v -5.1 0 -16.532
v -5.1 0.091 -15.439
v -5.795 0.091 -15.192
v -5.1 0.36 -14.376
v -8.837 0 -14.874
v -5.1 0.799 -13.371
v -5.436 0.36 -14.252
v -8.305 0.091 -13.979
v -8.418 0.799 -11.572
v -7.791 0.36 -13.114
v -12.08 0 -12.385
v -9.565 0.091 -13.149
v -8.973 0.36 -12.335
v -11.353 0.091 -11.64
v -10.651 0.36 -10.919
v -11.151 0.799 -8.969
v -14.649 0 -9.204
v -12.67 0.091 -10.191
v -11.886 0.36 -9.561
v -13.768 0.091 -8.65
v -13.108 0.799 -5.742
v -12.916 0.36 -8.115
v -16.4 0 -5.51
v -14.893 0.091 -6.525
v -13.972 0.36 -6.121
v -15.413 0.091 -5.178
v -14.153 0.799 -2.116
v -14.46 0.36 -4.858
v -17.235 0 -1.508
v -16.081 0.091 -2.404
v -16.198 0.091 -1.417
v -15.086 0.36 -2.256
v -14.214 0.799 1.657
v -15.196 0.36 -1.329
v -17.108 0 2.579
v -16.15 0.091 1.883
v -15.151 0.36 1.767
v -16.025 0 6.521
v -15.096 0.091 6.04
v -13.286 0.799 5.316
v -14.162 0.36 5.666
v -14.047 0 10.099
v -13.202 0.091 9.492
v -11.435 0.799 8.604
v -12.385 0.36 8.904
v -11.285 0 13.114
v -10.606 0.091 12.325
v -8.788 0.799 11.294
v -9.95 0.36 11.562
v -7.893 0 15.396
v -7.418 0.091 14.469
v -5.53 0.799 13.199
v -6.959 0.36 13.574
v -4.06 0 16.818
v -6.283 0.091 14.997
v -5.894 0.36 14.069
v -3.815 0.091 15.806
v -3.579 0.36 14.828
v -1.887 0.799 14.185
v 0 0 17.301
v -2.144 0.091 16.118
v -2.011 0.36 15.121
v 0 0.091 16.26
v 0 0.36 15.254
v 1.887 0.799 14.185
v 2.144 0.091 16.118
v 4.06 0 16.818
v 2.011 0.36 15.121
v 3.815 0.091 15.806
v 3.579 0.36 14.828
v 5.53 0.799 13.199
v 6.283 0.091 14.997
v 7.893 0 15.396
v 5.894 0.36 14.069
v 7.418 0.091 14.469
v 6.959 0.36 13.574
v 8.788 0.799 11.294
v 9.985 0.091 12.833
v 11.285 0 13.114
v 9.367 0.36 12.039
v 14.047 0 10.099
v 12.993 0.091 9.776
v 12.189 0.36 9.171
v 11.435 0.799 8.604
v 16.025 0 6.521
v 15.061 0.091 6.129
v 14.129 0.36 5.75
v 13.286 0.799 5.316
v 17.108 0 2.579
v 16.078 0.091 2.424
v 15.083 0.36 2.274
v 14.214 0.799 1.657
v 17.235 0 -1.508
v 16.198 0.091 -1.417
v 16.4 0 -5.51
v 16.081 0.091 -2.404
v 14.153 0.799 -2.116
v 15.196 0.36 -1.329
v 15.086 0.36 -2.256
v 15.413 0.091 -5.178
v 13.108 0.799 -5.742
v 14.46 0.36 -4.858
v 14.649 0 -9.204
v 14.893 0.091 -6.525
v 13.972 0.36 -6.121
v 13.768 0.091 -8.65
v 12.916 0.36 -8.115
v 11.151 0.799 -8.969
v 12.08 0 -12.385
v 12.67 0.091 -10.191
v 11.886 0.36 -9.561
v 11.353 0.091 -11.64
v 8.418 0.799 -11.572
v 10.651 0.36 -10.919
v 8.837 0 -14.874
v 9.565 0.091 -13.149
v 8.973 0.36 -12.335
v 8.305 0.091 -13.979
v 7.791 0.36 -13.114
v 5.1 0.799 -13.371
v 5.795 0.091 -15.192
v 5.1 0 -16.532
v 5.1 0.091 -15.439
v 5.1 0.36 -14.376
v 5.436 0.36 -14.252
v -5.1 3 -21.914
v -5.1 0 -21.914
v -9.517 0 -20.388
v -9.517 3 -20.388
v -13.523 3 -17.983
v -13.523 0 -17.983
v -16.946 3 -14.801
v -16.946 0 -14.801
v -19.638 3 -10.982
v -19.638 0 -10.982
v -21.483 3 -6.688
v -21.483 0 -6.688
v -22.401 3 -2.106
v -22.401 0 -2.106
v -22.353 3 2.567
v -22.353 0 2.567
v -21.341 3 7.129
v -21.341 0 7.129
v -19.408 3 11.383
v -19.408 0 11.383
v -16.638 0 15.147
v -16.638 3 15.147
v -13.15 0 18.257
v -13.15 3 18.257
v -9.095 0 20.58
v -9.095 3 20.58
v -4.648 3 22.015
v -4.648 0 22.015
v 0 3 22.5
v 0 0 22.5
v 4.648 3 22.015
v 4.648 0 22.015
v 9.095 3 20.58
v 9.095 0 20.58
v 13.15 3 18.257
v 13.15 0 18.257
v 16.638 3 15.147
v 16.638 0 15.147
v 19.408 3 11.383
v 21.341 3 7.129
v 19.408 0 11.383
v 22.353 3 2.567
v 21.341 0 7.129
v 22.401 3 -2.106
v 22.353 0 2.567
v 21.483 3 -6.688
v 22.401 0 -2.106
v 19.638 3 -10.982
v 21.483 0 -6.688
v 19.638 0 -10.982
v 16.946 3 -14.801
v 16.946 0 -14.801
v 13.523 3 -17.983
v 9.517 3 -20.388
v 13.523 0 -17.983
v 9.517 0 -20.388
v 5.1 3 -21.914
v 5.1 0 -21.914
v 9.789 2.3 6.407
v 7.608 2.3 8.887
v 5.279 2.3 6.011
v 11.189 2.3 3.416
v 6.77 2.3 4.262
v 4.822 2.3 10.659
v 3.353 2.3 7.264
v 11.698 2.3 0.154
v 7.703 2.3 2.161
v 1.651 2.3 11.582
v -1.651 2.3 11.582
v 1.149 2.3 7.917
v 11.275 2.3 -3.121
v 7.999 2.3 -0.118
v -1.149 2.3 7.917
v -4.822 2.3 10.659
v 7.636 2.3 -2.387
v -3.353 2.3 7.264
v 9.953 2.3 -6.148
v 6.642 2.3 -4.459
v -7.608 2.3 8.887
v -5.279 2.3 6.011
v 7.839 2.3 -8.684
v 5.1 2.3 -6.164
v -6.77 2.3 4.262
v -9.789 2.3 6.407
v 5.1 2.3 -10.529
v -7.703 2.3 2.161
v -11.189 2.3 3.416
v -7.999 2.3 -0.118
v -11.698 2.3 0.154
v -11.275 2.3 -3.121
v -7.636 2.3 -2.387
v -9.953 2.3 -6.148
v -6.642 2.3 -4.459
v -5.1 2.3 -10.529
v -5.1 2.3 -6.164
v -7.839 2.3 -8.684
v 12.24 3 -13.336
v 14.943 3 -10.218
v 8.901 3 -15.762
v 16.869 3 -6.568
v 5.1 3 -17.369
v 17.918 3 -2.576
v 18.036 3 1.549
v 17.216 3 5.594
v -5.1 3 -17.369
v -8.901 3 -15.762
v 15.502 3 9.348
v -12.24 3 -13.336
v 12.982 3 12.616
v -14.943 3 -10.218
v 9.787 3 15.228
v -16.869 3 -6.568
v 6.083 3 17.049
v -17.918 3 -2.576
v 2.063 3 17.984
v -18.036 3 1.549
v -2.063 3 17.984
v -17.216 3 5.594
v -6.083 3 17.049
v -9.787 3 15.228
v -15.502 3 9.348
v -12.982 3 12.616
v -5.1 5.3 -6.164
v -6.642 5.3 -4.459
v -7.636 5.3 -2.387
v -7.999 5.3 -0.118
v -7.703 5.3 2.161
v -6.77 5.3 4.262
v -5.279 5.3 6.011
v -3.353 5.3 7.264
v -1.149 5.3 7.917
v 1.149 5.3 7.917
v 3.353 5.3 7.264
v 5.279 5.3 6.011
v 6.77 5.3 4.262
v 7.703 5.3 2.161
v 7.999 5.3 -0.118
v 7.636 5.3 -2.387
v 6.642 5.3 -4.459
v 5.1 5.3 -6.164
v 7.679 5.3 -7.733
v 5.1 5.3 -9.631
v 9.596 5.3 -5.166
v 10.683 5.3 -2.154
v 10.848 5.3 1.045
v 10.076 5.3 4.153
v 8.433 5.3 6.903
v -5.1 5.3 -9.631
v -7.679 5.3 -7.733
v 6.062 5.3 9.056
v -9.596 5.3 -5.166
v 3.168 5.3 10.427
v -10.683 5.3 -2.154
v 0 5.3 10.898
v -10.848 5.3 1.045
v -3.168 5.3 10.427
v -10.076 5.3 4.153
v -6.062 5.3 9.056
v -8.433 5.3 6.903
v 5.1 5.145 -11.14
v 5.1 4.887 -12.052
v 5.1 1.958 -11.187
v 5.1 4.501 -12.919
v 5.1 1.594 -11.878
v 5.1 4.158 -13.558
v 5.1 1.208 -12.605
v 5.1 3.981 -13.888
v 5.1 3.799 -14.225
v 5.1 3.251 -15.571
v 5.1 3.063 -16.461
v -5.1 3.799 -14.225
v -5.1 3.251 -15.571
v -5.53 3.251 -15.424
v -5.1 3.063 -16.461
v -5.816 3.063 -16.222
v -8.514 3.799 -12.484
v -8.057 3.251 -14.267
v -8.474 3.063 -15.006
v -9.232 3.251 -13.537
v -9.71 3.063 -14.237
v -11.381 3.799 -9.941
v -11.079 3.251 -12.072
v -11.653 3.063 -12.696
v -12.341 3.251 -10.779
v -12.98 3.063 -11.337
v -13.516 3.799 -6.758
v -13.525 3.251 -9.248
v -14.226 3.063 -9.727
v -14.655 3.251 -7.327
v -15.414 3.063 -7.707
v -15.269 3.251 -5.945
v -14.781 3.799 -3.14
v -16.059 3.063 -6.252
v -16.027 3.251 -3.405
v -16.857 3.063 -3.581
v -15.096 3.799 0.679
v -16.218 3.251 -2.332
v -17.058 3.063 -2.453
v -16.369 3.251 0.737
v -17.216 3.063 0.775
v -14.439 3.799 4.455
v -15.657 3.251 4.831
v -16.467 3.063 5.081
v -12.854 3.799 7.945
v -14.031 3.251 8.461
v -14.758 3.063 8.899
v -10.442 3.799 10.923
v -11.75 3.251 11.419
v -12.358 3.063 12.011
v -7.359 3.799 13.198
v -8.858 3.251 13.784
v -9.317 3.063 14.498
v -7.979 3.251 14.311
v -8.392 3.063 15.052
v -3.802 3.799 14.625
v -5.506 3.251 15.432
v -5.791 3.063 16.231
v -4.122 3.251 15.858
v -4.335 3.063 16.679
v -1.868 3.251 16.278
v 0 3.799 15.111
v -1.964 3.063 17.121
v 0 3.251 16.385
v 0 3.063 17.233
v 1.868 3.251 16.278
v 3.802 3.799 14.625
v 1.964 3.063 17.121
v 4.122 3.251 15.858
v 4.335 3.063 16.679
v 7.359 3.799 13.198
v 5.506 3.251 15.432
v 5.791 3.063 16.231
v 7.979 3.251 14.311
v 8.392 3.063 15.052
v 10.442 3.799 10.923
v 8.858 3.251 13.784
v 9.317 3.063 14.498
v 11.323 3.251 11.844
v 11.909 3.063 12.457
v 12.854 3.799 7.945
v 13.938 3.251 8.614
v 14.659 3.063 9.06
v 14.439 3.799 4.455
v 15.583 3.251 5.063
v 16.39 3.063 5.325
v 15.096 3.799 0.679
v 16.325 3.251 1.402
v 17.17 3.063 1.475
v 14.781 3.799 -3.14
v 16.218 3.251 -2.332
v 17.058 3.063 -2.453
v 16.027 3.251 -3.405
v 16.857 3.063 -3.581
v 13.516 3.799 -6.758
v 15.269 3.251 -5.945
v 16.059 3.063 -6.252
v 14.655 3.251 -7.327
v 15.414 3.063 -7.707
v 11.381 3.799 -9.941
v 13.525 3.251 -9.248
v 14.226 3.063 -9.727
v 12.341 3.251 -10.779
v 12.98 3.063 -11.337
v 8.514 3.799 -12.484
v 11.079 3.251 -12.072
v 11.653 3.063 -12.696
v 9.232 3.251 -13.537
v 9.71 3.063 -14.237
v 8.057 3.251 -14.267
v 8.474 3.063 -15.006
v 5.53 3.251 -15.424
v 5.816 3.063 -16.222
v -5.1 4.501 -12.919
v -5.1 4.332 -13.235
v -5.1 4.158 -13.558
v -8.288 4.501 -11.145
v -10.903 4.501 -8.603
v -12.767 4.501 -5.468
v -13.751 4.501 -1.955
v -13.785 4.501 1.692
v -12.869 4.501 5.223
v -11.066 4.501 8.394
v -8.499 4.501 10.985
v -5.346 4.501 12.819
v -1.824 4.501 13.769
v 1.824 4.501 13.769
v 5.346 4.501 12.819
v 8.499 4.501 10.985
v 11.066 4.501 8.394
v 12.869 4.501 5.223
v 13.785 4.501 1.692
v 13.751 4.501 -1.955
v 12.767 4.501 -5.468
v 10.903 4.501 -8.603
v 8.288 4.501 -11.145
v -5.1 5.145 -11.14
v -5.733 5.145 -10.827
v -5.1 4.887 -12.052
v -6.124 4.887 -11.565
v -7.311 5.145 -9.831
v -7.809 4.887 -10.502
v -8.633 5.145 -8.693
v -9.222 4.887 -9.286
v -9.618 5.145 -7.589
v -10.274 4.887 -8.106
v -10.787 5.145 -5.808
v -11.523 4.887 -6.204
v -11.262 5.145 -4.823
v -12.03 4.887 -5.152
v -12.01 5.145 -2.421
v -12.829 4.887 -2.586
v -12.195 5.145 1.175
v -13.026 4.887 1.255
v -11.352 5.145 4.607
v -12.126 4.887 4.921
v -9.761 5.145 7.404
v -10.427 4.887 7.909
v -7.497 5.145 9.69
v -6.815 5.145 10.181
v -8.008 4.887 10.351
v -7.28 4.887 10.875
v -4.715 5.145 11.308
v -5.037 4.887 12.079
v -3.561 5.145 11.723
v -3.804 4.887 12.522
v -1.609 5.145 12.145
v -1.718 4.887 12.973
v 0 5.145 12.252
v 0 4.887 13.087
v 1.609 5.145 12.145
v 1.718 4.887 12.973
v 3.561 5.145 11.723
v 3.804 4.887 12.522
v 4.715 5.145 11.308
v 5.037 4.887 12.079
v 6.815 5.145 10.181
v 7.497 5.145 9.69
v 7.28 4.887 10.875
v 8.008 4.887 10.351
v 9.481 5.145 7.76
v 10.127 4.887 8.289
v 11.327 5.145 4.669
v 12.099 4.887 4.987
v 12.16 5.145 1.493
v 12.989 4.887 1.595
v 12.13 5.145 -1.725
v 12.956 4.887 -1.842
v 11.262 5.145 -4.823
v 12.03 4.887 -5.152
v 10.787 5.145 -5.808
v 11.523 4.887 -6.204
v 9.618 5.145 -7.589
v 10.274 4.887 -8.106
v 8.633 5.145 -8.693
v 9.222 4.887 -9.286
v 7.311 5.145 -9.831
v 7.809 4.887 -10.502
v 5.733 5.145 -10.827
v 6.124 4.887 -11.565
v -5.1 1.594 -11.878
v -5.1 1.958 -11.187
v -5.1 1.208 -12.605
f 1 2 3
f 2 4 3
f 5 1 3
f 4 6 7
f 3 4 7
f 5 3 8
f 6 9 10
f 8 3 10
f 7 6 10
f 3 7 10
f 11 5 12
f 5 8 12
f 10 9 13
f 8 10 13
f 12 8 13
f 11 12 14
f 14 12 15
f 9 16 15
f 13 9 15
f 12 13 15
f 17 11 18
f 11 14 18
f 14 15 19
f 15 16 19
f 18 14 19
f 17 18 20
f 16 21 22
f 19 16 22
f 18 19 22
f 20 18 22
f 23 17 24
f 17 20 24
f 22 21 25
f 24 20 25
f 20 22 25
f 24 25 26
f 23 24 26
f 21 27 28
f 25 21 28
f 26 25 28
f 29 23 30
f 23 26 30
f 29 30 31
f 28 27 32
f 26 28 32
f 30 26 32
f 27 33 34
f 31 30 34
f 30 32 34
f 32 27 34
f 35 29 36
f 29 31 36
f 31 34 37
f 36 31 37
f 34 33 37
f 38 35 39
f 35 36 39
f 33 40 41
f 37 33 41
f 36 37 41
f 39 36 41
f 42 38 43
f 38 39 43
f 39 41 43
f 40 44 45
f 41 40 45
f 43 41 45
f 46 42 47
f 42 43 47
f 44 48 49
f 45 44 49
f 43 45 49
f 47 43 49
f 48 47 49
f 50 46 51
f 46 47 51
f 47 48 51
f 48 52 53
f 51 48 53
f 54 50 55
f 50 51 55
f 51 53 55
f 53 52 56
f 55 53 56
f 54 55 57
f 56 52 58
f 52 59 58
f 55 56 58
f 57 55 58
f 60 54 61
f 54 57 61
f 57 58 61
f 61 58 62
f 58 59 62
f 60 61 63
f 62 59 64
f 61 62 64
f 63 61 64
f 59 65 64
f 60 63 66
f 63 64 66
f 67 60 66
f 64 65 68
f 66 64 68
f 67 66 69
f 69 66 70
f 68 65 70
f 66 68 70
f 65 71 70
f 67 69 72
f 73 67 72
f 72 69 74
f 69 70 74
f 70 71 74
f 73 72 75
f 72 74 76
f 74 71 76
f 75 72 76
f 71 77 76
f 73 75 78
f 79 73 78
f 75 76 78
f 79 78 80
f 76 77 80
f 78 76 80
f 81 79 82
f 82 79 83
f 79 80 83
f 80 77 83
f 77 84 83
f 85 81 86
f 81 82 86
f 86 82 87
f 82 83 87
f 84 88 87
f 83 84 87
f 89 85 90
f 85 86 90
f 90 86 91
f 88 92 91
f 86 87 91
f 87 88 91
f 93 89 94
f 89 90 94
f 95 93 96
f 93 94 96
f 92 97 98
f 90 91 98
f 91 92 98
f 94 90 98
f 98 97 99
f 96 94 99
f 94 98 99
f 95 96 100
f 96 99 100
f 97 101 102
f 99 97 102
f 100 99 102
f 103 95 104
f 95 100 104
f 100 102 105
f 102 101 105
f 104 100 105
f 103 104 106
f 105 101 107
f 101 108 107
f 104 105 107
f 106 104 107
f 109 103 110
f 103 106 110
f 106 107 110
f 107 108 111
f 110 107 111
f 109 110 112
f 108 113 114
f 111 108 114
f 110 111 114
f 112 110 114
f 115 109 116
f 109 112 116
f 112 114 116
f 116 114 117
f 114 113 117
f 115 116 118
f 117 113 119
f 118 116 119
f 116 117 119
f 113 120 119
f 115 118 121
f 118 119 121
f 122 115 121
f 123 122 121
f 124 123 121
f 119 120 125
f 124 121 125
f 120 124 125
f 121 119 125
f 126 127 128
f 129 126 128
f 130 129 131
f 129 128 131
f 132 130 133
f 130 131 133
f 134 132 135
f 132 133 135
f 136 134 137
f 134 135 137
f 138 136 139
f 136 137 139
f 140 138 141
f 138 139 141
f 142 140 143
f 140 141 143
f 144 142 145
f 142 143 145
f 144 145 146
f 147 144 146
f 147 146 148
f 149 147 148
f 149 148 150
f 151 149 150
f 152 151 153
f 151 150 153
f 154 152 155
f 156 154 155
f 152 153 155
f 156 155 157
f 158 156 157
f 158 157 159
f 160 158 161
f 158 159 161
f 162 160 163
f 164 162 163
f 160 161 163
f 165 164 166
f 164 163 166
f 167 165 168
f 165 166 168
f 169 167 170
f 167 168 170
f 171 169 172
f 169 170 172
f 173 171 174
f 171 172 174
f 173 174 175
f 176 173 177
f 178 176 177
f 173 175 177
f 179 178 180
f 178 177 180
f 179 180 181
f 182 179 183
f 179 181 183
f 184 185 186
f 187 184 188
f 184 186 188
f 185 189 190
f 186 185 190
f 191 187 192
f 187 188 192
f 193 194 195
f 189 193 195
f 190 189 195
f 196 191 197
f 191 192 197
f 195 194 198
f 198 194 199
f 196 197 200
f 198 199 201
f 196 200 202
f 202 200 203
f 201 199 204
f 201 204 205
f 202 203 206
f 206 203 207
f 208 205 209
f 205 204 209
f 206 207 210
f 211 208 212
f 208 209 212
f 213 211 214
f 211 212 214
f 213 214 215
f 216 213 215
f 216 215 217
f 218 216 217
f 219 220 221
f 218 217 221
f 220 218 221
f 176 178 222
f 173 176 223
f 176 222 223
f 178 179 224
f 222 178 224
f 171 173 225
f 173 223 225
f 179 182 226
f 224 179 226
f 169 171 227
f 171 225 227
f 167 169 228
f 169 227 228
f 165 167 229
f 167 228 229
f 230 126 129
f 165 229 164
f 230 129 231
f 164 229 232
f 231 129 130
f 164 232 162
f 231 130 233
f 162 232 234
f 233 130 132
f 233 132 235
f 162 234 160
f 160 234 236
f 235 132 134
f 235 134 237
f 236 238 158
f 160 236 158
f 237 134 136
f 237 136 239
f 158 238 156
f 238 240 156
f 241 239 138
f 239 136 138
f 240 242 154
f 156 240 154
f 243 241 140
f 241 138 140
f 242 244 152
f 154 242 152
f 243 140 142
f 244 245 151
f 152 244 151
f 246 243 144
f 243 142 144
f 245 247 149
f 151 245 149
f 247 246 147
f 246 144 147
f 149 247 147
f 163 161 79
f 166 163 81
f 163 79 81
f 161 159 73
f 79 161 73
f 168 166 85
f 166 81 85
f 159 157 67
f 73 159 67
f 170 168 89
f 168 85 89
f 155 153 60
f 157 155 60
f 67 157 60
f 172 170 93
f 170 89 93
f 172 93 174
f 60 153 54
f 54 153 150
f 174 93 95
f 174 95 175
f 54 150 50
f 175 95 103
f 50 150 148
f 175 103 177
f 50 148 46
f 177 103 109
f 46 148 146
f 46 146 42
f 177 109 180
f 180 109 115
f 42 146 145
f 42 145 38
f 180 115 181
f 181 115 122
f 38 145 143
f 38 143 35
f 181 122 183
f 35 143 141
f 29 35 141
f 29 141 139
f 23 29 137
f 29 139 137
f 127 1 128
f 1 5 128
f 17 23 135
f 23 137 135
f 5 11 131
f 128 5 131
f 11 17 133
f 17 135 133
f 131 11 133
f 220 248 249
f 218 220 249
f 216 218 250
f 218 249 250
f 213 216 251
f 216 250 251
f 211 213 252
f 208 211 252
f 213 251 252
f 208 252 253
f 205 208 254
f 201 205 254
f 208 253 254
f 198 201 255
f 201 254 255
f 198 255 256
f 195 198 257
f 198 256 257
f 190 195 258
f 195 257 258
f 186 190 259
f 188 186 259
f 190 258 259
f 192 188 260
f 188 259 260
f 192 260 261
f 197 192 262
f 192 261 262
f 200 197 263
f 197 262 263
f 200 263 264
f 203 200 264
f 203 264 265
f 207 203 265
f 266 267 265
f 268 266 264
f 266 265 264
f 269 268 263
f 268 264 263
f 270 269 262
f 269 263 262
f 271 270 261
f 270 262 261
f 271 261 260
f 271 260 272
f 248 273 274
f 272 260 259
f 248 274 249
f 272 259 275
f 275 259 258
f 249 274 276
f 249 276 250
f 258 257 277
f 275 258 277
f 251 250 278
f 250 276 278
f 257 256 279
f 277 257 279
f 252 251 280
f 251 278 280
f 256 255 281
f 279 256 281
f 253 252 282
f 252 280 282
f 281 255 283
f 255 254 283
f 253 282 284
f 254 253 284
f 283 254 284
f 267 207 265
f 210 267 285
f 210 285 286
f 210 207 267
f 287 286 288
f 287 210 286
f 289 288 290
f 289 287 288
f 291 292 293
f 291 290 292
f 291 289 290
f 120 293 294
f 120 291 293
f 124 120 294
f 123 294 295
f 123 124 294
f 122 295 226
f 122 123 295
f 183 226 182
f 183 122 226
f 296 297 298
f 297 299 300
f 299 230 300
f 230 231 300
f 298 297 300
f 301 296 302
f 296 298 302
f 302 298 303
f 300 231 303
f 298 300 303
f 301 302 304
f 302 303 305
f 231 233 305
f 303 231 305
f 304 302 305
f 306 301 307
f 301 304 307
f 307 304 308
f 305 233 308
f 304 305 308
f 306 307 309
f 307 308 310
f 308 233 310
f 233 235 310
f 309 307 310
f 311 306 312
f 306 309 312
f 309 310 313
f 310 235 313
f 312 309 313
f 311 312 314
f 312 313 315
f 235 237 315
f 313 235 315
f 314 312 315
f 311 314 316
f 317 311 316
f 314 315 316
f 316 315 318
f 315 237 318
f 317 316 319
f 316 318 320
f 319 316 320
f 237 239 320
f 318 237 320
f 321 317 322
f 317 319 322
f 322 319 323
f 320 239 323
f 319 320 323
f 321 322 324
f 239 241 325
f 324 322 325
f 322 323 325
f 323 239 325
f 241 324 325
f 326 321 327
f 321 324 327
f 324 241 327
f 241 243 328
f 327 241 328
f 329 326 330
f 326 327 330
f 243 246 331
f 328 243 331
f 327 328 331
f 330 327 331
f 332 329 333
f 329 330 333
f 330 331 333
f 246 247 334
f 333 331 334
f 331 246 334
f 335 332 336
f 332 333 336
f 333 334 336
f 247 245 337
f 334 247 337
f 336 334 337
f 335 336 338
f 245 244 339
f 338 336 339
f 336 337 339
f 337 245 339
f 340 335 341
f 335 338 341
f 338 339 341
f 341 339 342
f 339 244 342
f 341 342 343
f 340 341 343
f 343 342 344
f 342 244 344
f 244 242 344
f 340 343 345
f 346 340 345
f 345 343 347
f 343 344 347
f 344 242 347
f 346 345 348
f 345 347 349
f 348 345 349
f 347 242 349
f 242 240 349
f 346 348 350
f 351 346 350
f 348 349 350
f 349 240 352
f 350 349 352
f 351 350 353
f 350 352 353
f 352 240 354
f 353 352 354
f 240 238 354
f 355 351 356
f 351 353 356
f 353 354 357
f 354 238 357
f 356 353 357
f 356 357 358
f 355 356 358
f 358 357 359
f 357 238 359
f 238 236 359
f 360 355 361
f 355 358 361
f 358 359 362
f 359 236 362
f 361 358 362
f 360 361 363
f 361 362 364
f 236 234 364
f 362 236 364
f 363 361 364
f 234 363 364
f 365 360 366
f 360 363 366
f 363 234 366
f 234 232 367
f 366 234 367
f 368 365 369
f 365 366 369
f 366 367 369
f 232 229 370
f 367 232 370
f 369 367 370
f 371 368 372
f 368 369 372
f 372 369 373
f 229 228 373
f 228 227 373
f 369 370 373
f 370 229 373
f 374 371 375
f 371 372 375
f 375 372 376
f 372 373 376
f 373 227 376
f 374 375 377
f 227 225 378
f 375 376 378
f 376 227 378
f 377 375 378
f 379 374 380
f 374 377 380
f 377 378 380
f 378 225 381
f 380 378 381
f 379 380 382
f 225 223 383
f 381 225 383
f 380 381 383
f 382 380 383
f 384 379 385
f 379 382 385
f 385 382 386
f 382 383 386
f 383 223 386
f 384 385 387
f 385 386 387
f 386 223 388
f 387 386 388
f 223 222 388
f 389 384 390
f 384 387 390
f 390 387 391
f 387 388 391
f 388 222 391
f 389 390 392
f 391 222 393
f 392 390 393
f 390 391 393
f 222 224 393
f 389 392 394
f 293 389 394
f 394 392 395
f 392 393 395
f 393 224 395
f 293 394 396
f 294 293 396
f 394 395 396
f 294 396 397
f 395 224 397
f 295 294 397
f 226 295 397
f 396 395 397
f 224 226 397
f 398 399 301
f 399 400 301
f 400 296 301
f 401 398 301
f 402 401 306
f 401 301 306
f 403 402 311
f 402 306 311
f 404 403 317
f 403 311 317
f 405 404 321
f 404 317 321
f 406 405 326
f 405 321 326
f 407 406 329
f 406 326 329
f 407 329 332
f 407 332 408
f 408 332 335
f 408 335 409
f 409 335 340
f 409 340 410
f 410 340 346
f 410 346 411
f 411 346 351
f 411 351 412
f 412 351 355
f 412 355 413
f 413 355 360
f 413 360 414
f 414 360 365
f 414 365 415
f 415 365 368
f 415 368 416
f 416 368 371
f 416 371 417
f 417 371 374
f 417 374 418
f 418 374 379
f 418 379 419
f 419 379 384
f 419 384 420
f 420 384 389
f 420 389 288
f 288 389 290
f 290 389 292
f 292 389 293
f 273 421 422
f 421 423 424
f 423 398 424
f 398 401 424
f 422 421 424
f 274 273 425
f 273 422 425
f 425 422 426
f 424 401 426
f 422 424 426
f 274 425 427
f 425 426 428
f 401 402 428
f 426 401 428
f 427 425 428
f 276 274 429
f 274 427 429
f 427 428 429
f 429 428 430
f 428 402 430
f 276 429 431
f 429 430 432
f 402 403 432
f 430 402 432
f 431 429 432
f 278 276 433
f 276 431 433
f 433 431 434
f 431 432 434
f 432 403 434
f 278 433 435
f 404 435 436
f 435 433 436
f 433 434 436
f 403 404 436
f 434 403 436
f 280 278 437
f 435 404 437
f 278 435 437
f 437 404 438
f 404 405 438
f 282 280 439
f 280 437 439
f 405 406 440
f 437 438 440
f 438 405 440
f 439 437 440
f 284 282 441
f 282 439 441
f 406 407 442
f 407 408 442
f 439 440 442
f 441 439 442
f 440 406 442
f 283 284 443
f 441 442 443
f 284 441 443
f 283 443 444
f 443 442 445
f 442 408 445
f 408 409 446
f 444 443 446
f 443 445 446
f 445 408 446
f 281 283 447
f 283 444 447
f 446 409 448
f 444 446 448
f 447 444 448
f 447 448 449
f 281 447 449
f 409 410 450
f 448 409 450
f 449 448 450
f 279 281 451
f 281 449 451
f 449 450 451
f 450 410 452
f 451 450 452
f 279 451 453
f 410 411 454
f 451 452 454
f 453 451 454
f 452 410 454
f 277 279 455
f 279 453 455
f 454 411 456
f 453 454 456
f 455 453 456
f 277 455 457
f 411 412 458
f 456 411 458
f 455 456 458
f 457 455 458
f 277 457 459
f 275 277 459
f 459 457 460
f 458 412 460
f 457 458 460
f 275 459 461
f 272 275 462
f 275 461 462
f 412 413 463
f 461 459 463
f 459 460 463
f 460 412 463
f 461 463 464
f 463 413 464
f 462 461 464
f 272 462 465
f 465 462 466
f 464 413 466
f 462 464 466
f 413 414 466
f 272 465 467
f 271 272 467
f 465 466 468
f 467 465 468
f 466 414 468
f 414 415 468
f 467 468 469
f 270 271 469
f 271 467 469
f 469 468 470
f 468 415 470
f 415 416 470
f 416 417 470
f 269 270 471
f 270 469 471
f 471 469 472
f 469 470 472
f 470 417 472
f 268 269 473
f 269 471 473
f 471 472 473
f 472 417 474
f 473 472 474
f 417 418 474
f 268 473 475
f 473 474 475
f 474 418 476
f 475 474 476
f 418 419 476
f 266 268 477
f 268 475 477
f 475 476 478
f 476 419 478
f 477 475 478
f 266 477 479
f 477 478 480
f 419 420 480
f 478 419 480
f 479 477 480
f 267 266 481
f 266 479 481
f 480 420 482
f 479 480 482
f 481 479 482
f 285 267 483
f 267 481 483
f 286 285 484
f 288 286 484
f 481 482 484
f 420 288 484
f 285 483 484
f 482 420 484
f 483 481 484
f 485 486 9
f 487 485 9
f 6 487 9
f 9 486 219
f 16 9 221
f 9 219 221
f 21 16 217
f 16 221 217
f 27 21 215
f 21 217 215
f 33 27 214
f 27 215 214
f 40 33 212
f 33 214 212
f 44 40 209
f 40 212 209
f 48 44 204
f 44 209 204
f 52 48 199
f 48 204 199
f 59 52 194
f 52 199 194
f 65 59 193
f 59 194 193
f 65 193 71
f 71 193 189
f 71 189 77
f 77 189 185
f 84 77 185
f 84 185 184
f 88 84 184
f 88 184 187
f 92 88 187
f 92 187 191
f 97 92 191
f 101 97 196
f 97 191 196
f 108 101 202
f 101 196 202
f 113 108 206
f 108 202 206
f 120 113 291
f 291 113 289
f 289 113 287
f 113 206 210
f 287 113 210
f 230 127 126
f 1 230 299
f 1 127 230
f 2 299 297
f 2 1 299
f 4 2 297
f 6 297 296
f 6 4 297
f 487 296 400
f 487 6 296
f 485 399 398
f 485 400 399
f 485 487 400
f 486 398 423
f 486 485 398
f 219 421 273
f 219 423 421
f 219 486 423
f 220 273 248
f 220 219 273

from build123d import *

# Parameters (mm, degrees)
CUT_EXTRUDE1_DEPTH = 33.258177258
FILLET1_R          = 6


with BuildPart() as part:
    # Sketch2 → Revolve1 (revolve)
    with BuildSketch(Plane.XY, mode=Mode.PRIVATE) as revolve1_sk:
        Polygon((8, 2.3), (8, 5.3), (12.5, 5.3), (16.5, 3), (22.5, 3), (22.5, 0), (15.698988524, 0), (11.698988524, 2.3), align=None)
    revolve(revolve1_sk.sketch.rotate(Axis((0, 0, 0), (0, 1, 0)), 90), axis=Axis((0, 0, 0), (0, 1, 0)))

    # Sketch3 → Cut-Extrude1 (cut, through all)
    with BuildSketch(Plane(origin=(0, 0, 0), x_dir=(1, 0, 0), z_dir=(0, 1, 0))):
        with BuildLine():
            Line((-5.1, 21.914378841), (-5.1, 6.163602842))
            ThreePointArc((-5.1, 6.163602842), (0, 8), (5.1, 6.163602842))
            Line((5.1, 6.163602842), (5.1, 21.914378841))
            ThreePointArc((5.1, 21.914378841), (0, 22.5), (-5.1, 21.914378841))
        make_face()
    extrude(amount=CUT_EXTRUDE1_DEPTH, mode=Mode.SUBTRACT)

    # Fillet1
    fillet1_edges = [part.edges().sort_by_distance(p)[0] for p in [
        (0, 0, 15.698988524),
        (0, 3, 16.5),
        (0, 5.3, 12.5),
    ]]
    fillet(fillet1_edges, radius=FILLET1_R)


solid = part.part
